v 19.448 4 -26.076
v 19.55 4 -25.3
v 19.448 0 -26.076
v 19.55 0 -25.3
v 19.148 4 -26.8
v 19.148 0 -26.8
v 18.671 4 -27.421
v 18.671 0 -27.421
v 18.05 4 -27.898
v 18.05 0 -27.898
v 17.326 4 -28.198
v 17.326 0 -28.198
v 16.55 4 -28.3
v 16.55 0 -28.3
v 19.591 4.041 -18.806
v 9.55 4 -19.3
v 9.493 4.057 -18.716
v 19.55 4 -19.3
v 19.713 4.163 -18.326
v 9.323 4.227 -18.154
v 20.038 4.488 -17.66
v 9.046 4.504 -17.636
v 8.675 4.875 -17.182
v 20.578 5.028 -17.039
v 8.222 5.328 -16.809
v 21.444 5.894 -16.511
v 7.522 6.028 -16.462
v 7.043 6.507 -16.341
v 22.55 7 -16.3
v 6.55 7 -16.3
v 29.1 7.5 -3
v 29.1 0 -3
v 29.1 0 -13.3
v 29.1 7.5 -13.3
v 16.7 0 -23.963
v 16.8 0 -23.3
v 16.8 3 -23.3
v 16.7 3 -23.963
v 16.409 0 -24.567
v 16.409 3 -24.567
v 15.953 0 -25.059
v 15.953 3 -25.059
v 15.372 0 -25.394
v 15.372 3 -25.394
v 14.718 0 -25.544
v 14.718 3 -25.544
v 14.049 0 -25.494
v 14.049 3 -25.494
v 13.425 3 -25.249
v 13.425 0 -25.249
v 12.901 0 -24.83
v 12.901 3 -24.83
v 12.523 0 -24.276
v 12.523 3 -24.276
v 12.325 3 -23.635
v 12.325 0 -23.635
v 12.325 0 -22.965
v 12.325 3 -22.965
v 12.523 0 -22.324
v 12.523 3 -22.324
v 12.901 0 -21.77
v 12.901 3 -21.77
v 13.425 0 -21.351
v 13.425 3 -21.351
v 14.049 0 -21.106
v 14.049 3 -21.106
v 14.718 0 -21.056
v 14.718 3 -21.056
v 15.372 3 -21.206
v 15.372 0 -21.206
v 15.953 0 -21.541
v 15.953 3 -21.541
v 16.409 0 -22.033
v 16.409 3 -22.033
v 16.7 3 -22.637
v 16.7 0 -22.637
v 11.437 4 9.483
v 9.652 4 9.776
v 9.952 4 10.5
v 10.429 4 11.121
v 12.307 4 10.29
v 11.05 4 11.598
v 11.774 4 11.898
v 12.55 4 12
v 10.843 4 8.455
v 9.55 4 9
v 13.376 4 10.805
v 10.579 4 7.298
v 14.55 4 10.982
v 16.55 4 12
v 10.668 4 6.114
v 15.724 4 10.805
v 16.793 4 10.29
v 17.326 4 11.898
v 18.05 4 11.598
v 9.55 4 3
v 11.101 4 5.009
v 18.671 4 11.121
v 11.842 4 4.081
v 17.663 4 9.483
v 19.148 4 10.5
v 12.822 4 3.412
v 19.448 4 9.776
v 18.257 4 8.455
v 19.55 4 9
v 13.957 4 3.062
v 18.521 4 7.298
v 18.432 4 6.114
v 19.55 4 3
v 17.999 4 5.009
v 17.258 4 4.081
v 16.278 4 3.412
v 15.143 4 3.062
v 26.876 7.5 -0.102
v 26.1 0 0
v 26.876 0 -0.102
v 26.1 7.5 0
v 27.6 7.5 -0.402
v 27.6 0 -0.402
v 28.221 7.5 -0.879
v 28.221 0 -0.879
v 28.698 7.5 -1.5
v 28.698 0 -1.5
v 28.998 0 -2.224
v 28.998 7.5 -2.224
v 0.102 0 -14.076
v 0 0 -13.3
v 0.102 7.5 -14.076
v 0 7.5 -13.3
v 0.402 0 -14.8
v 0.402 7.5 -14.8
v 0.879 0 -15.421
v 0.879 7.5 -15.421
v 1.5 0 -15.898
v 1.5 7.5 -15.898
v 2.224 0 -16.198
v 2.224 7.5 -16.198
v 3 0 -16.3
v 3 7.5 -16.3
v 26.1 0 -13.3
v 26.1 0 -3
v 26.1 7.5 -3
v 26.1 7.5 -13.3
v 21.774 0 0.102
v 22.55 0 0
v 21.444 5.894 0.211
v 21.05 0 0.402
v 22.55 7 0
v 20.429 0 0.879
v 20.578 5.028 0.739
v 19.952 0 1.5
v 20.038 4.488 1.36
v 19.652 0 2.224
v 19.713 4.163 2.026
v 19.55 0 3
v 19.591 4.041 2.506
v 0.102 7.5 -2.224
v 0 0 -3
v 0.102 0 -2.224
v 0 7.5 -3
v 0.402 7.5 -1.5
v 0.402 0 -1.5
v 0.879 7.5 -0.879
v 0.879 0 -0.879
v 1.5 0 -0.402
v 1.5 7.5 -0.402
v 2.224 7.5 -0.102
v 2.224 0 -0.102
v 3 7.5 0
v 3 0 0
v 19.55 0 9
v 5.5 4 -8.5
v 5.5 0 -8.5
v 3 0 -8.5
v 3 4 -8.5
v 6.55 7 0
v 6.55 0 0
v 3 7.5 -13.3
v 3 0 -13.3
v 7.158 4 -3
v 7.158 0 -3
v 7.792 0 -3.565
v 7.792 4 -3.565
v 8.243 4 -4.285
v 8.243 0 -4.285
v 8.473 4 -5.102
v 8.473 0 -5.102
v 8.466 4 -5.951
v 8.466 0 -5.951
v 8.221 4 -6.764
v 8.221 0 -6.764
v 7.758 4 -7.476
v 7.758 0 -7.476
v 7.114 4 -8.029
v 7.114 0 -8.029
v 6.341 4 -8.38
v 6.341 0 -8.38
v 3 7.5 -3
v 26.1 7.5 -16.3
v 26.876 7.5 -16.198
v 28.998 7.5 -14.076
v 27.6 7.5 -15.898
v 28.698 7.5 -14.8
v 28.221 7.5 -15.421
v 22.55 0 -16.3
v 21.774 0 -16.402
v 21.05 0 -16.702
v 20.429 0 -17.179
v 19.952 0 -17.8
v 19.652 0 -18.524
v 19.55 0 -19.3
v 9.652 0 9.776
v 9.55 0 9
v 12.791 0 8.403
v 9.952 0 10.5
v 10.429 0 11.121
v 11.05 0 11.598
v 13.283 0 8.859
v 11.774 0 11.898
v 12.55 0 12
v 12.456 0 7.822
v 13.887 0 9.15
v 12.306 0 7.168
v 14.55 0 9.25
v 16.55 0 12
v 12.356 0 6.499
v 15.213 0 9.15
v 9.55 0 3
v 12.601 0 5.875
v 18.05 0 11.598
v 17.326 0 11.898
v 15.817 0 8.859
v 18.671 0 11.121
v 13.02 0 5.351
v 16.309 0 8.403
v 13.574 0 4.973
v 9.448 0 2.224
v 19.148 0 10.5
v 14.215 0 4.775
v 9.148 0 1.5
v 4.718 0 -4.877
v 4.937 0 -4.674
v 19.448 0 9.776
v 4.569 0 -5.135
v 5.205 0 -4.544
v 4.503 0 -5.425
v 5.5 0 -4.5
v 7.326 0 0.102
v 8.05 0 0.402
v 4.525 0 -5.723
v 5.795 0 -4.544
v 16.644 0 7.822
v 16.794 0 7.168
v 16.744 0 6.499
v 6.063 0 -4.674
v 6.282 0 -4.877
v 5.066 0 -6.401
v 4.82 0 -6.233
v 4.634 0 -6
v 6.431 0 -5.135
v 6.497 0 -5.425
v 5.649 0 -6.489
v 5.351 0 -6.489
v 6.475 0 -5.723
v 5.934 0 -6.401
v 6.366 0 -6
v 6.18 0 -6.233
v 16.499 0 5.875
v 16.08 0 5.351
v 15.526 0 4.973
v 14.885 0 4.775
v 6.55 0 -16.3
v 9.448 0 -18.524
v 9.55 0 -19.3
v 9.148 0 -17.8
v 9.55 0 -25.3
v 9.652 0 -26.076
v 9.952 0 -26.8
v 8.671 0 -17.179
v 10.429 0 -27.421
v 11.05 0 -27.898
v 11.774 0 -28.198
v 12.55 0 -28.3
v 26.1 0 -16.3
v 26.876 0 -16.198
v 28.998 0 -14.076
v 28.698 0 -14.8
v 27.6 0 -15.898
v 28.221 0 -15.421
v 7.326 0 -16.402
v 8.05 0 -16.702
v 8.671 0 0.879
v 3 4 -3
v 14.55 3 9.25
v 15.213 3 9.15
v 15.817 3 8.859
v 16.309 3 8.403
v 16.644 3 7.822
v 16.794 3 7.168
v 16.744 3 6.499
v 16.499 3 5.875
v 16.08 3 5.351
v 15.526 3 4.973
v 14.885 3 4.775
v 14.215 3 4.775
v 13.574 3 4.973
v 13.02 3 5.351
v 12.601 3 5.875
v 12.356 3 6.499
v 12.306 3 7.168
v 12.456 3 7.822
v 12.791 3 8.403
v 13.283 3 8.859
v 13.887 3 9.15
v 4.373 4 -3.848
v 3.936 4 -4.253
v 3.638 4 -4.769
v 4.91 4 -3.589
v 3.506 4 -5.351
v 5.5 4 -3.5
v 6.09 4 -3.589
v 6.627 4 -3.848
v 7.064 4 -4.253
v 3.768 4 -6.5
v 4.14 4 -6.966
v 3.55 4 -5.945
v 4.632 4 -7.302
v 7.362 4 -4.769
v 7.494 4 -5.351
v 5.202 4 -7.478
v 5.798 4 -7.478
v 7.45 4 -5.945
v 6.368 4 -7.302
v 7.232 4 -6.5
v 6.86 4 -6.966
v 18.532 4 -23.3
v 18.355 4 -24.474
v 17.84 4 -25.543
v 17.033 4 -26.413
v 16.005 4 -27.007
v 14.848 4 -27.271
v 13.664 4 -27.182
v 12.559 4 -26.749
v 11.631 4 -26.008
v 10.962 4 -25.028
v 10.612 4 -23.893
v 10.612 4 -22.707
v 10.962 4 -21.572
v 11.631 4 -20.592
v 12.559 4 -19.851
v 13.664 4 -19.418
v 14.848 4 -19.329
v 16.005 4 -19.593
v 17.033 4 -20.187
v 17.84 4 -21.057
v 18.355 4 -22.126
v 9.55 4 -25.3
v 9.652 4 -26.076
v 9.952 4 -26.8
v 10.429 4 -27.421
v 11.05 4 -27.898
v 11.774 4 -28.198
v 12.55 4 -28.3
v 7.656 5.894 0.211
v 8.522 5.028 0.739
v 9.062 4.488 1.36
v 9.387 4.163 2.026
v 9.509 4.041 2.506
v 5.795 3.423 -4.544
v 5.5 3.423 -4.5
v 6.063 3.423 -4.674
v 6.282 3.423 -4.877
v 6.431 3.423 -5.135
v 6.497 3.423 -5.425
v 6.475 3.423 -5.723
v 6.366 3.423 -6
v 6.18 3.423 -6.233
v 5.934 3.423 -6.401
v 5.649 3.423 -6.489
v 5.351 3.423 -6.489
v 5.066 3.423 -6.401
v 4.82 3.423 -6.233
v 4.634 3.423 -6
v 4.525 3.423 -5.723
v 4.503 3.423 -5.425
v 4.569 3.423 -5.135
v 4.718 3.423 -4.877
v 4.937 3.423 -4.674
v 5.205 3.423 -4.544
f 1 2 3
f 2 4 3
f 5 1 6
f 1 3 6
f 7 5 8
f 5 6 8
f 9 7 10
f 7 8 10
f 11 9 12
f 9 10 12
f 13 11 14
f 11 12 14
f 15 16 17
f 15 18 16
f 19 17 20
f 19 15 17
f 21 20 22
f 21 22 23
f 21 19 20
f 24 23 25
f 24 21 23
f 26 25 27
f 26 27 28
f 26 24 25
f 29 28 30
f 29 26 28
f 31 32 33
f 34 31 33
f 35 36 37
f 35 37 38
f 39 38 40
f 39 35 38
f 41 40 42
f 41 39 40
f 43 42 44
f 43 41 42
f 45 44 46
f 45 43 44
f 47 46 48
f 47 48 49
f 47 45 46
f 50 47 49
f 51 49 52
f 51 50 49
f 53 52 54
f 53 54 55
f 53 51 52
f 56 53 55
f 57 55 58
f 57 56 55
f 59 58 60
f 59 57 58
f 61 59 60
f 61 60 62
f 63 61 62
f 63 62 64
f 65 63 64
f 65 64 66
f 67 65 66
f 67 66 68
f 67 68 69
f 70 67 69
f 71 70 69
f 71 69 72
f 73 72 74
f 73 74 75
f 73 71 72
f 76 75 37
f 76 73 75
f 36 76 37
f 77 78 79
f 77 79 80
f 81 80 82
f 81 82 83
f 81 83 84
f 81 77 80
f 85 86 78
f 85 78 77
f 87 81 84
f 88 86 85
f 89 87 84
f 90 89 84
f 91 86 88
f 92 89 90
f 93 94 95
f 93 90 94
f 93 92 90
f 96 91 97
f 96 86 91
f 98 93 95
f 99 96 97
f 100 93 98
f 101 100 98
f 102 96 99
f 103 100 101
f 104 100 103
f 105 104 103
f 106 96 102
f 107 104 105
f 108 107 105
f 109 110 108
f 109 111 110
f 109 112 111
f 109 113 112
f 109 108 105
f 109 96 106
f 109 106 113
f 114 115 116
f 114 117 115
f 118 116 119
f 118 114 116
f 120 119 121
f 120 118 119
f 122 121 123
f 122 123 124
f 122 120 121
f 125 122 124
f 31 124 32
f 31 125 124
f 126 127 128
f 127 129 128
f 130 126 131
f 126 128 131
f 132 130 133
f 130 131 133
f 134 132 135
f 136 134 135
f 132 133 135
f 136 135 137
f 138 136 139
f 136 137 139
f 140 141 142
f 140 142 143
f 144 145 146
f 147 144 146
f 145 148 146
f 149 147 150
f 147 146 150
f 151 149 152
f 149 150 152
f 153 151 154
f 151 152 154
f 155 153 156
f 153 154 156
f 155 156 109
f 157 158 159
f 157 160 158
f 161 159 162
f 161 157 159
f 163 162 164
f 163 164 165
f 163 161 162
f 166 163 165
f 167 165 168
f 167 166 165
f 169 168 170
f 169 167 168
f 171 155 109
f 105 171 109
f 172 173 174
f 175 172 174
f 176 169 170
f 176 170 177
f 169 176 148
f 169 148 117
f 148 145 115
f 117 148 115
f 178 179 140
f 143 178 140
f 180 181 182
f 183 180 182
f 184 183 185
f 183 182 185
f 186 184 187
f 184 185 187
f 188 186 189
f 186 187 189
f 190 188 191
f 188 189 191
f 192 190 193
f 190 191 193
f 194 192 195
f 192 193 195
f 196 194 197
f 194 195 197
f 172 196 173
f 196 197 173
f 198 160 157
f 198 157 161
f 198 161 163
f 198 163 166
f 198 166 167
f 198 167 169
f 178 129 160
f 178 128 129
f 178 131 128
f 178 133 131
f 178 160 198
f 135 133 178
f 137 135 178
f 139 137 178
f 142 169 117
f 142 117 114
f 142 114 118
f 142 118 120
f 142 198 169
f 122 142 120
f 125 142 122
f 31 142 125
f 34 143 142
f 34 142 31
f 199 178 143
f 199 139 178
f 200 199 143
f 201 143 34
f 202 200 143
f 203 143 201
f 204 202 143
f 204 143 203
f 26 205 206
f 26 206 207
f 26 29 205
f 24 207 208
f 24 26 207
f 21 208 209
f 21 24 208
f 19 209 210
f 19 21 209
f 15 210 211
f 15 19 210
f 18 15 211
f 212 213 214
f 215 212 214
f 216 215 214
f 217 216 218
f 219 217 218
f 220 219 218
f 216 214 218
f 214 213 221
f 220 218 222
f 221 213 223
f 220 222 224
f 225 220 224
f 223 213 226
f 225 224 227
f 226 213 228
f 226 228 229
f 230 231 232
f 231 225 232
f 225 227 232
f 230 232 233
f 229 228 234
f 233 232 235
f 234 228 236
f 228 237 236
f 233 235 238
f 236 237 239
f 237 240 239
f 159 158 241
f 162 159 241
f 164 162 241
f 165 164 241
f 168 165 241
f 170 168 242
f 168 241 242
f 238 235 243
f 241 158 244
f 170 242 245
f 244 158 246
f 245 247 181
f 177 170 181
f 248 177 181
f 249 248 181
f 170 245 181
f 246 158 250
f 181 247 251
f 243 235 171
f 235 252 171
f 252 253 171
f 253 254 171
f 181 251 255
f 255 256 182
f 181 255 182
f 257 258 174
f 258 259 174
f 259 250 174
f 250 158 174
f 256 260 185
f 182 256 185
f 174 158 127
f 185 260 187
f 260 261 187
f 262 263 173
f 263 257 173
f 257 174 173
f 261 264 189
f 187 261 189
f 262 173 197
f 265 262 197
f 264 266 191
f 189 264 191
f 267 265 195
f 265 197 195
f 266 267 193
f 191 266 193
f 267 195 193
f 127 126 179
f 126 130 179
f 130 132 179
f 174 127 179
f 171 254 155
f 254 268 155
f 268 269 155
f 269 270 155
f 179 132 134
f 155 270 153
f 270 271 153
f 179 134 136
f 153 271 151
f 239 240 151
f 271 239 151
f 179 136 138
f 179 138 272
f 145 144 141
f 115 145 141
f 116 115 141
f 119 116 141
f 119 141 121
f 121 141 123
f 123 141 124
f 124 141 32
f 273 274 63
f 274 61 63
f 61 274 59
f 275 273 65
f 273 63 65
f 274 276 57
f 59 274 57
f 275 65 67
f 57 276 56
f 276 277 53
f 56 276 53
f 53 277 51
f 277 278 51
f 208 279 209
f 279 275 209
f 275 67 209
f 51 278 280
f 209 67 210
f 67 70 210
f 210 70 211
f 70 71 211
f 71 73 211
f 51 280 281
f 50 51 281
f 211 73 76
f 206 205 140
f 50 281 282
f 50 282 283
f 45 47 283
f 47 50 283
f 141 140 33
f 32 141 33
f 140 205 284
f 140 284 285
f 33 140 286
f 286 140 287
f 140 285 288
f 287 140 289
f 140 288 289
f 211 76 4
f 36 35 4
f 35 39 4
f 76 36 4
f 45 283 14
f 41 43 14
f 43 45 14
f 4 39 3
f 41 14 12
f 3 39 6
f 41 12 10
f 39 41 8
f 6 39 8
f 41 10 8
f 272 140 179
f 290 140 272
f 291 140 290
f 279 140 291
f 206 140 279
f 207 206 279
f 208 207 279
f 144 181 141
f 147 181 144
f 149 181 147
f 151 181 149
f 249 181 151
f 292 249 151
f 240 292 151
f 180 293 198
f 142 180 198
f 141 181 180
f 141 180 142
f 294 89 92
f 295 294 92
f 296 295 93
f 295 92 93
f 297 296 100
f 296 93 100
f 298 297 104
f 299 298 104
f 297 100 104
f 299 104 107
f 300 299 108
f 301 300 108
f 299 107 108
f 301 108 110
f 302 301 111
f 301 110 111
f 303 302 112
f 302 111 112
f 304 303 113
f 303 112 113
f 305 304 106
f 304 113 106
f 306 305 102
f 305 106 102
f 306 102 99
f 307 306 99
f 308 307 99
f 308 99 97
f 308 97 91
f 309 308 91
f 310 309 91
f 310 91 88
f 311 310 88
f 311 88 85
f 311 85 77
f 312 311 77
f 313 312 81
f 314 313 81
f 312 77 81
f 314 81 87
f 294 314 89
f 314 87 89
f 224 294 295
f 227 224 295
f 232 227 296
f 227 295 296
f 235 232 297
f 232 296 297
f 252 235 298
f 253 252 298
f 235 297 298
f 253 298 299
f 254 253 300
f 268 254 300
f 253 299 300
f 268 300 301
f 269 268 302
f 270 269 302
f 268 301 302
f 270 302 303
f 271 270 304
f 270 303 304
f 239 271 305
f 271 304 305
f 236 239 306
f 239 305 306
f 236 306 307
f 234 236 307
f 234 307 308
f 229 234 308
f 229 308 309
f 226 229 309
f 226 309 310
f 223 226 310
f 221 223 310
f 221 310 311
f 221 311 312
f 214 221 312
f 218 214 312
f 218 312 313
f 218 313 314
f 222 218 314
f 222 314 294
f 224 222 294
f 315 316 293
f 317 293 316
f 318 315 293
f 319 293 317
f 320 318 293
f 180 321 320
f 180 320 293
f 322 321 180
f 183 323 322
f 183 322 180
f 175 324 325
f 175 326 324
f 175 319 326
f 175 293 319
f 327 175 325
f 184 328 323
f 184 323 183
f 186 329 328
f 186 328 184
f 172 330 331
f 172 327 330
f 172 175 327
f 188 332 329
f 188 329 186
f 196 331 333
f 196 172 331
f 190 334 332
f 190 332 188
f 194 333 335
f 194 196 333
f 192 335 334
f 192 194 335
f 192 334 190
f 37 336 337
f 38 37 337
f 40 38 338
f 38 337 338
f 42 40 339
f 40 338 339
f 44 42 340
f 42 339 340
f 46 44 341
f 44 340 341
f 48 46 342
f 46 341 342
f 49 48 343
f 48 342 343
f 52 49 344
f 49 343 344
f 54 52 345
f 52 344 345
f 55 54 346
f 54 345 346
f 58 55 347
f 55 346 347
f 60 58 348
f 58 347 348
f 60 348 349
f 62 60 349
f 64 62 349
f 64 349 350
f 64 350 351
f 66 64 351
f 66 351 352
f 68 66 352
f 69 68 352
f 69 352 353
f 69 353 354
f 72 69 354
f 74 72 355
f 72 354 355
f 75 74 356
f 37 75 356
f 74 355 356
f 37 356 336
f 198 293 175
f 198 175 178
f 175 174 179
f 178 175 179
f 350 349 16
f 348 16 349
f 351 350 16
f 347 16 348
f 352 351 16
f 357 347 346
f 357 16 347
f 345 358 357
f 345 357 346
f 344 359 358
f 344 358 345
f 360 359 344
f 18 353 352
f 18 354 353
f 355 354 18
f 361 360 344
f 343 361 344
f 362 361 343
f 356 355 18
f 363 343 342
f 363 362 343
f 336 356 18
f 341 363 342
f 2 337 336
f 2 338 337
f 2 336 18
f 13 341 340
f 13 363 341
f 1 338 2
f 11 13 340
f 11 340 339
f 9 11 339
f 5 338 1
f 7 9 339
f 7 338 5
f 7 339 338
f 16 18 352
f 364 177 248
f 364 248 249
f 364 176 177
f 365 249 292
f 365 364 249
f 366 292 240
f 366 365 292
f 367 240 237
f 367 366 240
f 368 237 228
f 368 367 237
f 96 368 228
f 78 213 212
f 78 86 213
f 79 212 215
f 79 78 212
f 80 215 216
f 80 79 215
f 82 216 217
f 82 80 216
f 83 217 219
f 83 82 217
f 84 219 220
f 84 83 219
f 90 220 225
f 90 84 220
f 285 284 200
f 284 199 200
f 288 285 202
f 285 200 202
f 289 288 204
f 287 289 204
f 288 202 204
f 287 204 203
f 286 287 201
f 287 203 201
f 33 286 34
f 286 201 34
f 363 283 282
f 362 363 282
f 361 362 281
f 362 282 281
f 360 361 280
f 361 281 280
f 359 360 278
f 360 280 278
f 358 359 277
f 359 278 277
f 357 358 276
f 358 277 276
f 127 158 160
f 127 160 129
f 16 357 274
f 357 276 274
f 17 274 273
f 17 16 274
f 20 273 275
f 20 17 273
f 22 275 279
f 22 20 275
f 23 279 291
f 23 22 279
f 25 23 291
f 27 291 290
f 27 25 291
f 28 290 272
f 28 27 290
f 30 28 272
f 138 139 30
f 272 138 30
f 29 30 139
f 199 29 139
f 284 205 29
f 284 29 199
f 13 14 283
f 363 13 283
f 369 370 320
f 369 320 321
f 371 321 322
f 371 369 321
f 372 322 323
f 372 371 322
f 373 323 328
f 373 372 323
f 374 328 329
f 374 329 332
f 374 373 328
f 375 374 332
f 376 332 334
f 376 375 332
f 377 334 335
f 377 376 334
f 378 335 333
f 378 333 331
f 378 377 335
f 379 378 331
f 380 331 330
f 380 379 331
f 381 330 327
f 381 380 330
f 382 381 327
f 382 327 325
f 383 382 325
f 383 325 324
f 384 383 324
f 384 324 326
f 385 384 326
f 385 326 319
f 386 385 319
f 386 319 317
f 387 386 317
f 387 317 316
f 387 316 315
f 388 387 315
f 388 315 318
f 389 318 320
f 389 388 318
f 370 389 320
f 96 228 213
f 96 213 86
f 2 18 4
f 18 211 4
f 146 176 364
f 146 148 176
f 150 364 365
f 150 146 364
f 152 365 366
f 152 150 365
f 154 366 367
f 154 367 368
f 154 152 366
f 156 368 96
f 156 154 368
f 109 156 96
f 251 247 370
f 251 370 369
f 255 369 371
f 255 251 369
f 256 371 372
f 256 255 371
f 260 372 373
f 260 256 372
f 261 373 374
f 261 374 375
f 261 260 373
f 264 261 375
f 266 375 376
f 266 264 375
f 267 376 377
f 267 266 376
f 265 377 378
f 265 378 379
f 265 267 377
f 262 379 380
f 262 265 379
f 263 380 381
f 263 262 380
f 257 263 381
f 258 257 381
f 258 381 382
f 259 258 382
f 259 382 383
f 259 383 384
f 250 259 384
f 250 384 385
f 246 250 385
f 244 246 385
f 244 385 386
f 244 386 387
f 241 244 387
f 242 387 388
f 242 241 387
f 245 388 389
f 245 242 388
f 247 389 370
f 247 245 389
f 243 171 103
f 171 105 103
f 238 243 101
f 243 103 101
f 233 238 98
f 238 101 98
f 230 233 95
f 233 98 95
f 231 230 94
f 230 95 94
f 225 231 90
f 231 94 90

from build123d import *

# Parameters (mm, degrees)
SKETCH5_W             = 29.1
SKETCH5_H             = 16.3
SKETCH5_W_2           = 23.1
SKETCH5_H_2           = 10.3
BOSS_EXTRUDE3_DEPTH   = 7.5
FILLET1_R             = 3
SKETCH7_R             = 1
BOSS_EXTRUDE5_DEPTH   = 4
SKETCH11_W            = 10
SKETCH11_H            = 4
BOSS_EXTRUDE6_DEPTH   = 12
FILLET3_R             = 3
SKETCH13_R            = 2.25
CUT_EXTRUDE1_DEPTH    = 34.593154064
CHAMFER2_SIZE         = 1
CHAMFER2_SIZE2        = 1.732050808
CIRPATTERN1_OUTLINE_R = 2.25
CIRPATTERN1_DEPTH     = 2.9999999
CIRPATTERN1_START     = 2.9999999
CIRPATTERN1_2_DEPTH   = 1.0000001
FILLET5_R             = 3
CHAMFER3_SIZE         = 1
CHAMFER3_SIZE2        = 0.577350269


with BuildPart() as part:
    # Sketch5 → Boss-Extrude3 (new body)
    with BuildSketch(Plane(origin=(0, 0, 0), x_dir=(1, 0, 0), z_dir=(0, 1, 0))):
        with Locations((14.55, 8.15)):
            Rectangle(SKETCH5_W, SKETCH5_H)
        with Locations((14.55, 8.15)):
            Rectangle(SKETCH5_W_2, SKETCH5_H_2, mode=Mode.SUBTRACT)
    extrude(amount=BOSS_EXTRUDE3_DEPTH)

    # Fillet1
    fillet1_edges = [part.edges().sort_by_distance(p)[0] for p in [
        (29.1, 3.75, -16.3),
        (29.1, 3.75, 0),
        (0, 3.75, 0),
        (0, 3.75, -16.3),
    ]]
    fillet(fillet1_edges, radius=FILLET1_R)

    # Sketch7 → Boss-Extrude5 (add)
    with BuildSketch(Plane(origin=(0, 0, 0), x_dir=(1, 0, 0), z_dir=(0, 1, 0))):
        with BuildLine():
            Line((5.5, 8.5), (3, 8.5))
            Line((3, 8.5), (3, 2.5))
            Line((3, 2.5), (5.5, 2.5))
            ThreePointArc((5.5, 2.5), (8.5, 5.5), (5.5, 8.5))
        make_face()
        with Locations(Location((5.5, 5.5, 0), (0, 0, 270))):
            Circle(SKETCH7_R, mode=Mode.SUBTRACT)
    extrude(amount=BOSS_EXTRUDE5_DEPTH)

    # Sketch11 → Boss-Extrude6 (add)
    with BuildSketch(Plane.XY):
        with Locations((14.55, 2)):
            Rectangle(SKETCH11_W, SKETCH11_H)
    extrude(amount=BOSS_EXTRUDE6_DEPTH)

    # Fillet3
    fillet3_edges = [part.edges().sort_by_distance(p)[0] for p in [
        (9.55, 2, 0),
        (19.55, 2, 0),
        (14.55, 4, 0),
        (9.55, 2, 12),
        (19.55, 2, 12),
    ]]
    fillet(fillet3_edges, radius=FILLET3_R)

    # Sketch13 → Cut-Extrude1 (cut, through all)
    with BuildSketch(Plane(origin=(0, 4, 0), x_dir=(1, 0, 0), z_dir=(0, 1, 0))):
        with Locations(Location((14.55, -7, 0), (0, 0, 270))):
            Circle(SKETCH13_R)
    extrude(amount=-CUT_EXTRUDE1_DEPTH, mode=Mode.SUBTRACT)

    # Chamfer2
    chamfer2_edges = [part.edges().sort_by_distance(p)[0] for p in [
        (14.55, 4, 4.75),
    ]]
    chamfer2_side = [part.faces().sort_by_distance(p)[0] for p in [
        (14.55, 2, 4.75),
    ]]
    chamfer(chamfer2_edges, length=CHAMFER2_SIZE, length2=CHAMFER2_SIZE2, reference=chamfer2_side[0])

    # CirPattern1: read off the stored shape, not the designer's step
    # CirPattern1 outline → CirPattern1 (add)
    with BuildSketch(Plane(origin=(0, 0, 0), x_dir=(1, 0, 0), z_dir=(0, 1, 0))):
        with BuildLine():
            Line((9.55, 25.3), (9.55, 16.3))
            Line((9.55, 16.3), (19.55, 16.3))
            Line((19.55, 16.3), (19.55, 25.3))
            ThreePointArc((19.55, 25.3), (18.671320344, 27.421320344), (16.55, 28.3))
            Line((16.55, 28.3), (12.55, 28.3))
            ThreePointArc((12.55, 28.3), (10.428679656, 27.421320344), (9.55, 25.3))
        make_face()
        with Locations((14.55, 23.3)):
            Circle(CIRPATTERN1_OUTLINE_R, mode=Mode.SUBTRACT)
    extrude(amount=CIRPATTERN1_DEPTH)

    # CirPattern1 2 outline → CirPattern1 2 (add)
    with BuildSketch(Plane(origin=(0, 0, 0), x_dir=(1, 0, 0), z_dir=(0, 1, 0)).offset(CIRPATTERN1_START)):
        with BuildLine():
            Line((9.55, 25.3), (9.55, 16.3))
            Line((9.55, 16.3), (19.55, 16.3))
            Line((19.55, 16.3), (19.55, 25.3))
            ThreePointArc((19.55, 25.3), (18.671320344, 27.421320344), (16.55, 28.3))
            Line((16.55, 28.3), (12.55, 28.3))
            ThreePointArc((12.55, 28.3), (10.428679656, 27.421320344), (9.55, 25.3))
        make_face()
    extrude(amount=CIRPATTERN1_2_DEPTH)

    # CirPattern1 3 outline → CirPattern1 3 (revolve, cut)
    with BuildSketch(Plane(origin=(14.55, 0, -23.3), x_dir=(1, 0, 0), z_dir=(0, 0, 1))):
        Polygon((0, 2.9999999), (2.25, 2.9999999), (3.982050808, 4), (0, 4), align=None)
    revolve(axis=Axis((14.55, 0, -23.3), (0, 1, 0)), mode=Mode.SUBTRACT)

    # Fillet5
    fillet5_edges = [part.edges().sort_by_distance(p)[0] for p in [
        (19.55, 2, -16.3),
        (9.55, 2, -16.3),
        (14.55, 4, -16.3),
    ]]
    fillet(fillet5_edges, radius=FILLET5_R)

    # Chamfer3
    chamfer3_edges = [part.edges().sort_by_distance(p)[0] for p in [
        (5.5, 4, -6.5),
    ]]
    chamfer3_side = [part.faces().sort_by_distance(p)[0] for p in [
        (8.297810971, 4, -6.343571748),
    ]]
    chamfer(chamfer3_edges, length=CHAMFER3_SIZE, length2=CHAMFER3_SIZE2, reference=chamfer3_side[0])


solid = part.part
